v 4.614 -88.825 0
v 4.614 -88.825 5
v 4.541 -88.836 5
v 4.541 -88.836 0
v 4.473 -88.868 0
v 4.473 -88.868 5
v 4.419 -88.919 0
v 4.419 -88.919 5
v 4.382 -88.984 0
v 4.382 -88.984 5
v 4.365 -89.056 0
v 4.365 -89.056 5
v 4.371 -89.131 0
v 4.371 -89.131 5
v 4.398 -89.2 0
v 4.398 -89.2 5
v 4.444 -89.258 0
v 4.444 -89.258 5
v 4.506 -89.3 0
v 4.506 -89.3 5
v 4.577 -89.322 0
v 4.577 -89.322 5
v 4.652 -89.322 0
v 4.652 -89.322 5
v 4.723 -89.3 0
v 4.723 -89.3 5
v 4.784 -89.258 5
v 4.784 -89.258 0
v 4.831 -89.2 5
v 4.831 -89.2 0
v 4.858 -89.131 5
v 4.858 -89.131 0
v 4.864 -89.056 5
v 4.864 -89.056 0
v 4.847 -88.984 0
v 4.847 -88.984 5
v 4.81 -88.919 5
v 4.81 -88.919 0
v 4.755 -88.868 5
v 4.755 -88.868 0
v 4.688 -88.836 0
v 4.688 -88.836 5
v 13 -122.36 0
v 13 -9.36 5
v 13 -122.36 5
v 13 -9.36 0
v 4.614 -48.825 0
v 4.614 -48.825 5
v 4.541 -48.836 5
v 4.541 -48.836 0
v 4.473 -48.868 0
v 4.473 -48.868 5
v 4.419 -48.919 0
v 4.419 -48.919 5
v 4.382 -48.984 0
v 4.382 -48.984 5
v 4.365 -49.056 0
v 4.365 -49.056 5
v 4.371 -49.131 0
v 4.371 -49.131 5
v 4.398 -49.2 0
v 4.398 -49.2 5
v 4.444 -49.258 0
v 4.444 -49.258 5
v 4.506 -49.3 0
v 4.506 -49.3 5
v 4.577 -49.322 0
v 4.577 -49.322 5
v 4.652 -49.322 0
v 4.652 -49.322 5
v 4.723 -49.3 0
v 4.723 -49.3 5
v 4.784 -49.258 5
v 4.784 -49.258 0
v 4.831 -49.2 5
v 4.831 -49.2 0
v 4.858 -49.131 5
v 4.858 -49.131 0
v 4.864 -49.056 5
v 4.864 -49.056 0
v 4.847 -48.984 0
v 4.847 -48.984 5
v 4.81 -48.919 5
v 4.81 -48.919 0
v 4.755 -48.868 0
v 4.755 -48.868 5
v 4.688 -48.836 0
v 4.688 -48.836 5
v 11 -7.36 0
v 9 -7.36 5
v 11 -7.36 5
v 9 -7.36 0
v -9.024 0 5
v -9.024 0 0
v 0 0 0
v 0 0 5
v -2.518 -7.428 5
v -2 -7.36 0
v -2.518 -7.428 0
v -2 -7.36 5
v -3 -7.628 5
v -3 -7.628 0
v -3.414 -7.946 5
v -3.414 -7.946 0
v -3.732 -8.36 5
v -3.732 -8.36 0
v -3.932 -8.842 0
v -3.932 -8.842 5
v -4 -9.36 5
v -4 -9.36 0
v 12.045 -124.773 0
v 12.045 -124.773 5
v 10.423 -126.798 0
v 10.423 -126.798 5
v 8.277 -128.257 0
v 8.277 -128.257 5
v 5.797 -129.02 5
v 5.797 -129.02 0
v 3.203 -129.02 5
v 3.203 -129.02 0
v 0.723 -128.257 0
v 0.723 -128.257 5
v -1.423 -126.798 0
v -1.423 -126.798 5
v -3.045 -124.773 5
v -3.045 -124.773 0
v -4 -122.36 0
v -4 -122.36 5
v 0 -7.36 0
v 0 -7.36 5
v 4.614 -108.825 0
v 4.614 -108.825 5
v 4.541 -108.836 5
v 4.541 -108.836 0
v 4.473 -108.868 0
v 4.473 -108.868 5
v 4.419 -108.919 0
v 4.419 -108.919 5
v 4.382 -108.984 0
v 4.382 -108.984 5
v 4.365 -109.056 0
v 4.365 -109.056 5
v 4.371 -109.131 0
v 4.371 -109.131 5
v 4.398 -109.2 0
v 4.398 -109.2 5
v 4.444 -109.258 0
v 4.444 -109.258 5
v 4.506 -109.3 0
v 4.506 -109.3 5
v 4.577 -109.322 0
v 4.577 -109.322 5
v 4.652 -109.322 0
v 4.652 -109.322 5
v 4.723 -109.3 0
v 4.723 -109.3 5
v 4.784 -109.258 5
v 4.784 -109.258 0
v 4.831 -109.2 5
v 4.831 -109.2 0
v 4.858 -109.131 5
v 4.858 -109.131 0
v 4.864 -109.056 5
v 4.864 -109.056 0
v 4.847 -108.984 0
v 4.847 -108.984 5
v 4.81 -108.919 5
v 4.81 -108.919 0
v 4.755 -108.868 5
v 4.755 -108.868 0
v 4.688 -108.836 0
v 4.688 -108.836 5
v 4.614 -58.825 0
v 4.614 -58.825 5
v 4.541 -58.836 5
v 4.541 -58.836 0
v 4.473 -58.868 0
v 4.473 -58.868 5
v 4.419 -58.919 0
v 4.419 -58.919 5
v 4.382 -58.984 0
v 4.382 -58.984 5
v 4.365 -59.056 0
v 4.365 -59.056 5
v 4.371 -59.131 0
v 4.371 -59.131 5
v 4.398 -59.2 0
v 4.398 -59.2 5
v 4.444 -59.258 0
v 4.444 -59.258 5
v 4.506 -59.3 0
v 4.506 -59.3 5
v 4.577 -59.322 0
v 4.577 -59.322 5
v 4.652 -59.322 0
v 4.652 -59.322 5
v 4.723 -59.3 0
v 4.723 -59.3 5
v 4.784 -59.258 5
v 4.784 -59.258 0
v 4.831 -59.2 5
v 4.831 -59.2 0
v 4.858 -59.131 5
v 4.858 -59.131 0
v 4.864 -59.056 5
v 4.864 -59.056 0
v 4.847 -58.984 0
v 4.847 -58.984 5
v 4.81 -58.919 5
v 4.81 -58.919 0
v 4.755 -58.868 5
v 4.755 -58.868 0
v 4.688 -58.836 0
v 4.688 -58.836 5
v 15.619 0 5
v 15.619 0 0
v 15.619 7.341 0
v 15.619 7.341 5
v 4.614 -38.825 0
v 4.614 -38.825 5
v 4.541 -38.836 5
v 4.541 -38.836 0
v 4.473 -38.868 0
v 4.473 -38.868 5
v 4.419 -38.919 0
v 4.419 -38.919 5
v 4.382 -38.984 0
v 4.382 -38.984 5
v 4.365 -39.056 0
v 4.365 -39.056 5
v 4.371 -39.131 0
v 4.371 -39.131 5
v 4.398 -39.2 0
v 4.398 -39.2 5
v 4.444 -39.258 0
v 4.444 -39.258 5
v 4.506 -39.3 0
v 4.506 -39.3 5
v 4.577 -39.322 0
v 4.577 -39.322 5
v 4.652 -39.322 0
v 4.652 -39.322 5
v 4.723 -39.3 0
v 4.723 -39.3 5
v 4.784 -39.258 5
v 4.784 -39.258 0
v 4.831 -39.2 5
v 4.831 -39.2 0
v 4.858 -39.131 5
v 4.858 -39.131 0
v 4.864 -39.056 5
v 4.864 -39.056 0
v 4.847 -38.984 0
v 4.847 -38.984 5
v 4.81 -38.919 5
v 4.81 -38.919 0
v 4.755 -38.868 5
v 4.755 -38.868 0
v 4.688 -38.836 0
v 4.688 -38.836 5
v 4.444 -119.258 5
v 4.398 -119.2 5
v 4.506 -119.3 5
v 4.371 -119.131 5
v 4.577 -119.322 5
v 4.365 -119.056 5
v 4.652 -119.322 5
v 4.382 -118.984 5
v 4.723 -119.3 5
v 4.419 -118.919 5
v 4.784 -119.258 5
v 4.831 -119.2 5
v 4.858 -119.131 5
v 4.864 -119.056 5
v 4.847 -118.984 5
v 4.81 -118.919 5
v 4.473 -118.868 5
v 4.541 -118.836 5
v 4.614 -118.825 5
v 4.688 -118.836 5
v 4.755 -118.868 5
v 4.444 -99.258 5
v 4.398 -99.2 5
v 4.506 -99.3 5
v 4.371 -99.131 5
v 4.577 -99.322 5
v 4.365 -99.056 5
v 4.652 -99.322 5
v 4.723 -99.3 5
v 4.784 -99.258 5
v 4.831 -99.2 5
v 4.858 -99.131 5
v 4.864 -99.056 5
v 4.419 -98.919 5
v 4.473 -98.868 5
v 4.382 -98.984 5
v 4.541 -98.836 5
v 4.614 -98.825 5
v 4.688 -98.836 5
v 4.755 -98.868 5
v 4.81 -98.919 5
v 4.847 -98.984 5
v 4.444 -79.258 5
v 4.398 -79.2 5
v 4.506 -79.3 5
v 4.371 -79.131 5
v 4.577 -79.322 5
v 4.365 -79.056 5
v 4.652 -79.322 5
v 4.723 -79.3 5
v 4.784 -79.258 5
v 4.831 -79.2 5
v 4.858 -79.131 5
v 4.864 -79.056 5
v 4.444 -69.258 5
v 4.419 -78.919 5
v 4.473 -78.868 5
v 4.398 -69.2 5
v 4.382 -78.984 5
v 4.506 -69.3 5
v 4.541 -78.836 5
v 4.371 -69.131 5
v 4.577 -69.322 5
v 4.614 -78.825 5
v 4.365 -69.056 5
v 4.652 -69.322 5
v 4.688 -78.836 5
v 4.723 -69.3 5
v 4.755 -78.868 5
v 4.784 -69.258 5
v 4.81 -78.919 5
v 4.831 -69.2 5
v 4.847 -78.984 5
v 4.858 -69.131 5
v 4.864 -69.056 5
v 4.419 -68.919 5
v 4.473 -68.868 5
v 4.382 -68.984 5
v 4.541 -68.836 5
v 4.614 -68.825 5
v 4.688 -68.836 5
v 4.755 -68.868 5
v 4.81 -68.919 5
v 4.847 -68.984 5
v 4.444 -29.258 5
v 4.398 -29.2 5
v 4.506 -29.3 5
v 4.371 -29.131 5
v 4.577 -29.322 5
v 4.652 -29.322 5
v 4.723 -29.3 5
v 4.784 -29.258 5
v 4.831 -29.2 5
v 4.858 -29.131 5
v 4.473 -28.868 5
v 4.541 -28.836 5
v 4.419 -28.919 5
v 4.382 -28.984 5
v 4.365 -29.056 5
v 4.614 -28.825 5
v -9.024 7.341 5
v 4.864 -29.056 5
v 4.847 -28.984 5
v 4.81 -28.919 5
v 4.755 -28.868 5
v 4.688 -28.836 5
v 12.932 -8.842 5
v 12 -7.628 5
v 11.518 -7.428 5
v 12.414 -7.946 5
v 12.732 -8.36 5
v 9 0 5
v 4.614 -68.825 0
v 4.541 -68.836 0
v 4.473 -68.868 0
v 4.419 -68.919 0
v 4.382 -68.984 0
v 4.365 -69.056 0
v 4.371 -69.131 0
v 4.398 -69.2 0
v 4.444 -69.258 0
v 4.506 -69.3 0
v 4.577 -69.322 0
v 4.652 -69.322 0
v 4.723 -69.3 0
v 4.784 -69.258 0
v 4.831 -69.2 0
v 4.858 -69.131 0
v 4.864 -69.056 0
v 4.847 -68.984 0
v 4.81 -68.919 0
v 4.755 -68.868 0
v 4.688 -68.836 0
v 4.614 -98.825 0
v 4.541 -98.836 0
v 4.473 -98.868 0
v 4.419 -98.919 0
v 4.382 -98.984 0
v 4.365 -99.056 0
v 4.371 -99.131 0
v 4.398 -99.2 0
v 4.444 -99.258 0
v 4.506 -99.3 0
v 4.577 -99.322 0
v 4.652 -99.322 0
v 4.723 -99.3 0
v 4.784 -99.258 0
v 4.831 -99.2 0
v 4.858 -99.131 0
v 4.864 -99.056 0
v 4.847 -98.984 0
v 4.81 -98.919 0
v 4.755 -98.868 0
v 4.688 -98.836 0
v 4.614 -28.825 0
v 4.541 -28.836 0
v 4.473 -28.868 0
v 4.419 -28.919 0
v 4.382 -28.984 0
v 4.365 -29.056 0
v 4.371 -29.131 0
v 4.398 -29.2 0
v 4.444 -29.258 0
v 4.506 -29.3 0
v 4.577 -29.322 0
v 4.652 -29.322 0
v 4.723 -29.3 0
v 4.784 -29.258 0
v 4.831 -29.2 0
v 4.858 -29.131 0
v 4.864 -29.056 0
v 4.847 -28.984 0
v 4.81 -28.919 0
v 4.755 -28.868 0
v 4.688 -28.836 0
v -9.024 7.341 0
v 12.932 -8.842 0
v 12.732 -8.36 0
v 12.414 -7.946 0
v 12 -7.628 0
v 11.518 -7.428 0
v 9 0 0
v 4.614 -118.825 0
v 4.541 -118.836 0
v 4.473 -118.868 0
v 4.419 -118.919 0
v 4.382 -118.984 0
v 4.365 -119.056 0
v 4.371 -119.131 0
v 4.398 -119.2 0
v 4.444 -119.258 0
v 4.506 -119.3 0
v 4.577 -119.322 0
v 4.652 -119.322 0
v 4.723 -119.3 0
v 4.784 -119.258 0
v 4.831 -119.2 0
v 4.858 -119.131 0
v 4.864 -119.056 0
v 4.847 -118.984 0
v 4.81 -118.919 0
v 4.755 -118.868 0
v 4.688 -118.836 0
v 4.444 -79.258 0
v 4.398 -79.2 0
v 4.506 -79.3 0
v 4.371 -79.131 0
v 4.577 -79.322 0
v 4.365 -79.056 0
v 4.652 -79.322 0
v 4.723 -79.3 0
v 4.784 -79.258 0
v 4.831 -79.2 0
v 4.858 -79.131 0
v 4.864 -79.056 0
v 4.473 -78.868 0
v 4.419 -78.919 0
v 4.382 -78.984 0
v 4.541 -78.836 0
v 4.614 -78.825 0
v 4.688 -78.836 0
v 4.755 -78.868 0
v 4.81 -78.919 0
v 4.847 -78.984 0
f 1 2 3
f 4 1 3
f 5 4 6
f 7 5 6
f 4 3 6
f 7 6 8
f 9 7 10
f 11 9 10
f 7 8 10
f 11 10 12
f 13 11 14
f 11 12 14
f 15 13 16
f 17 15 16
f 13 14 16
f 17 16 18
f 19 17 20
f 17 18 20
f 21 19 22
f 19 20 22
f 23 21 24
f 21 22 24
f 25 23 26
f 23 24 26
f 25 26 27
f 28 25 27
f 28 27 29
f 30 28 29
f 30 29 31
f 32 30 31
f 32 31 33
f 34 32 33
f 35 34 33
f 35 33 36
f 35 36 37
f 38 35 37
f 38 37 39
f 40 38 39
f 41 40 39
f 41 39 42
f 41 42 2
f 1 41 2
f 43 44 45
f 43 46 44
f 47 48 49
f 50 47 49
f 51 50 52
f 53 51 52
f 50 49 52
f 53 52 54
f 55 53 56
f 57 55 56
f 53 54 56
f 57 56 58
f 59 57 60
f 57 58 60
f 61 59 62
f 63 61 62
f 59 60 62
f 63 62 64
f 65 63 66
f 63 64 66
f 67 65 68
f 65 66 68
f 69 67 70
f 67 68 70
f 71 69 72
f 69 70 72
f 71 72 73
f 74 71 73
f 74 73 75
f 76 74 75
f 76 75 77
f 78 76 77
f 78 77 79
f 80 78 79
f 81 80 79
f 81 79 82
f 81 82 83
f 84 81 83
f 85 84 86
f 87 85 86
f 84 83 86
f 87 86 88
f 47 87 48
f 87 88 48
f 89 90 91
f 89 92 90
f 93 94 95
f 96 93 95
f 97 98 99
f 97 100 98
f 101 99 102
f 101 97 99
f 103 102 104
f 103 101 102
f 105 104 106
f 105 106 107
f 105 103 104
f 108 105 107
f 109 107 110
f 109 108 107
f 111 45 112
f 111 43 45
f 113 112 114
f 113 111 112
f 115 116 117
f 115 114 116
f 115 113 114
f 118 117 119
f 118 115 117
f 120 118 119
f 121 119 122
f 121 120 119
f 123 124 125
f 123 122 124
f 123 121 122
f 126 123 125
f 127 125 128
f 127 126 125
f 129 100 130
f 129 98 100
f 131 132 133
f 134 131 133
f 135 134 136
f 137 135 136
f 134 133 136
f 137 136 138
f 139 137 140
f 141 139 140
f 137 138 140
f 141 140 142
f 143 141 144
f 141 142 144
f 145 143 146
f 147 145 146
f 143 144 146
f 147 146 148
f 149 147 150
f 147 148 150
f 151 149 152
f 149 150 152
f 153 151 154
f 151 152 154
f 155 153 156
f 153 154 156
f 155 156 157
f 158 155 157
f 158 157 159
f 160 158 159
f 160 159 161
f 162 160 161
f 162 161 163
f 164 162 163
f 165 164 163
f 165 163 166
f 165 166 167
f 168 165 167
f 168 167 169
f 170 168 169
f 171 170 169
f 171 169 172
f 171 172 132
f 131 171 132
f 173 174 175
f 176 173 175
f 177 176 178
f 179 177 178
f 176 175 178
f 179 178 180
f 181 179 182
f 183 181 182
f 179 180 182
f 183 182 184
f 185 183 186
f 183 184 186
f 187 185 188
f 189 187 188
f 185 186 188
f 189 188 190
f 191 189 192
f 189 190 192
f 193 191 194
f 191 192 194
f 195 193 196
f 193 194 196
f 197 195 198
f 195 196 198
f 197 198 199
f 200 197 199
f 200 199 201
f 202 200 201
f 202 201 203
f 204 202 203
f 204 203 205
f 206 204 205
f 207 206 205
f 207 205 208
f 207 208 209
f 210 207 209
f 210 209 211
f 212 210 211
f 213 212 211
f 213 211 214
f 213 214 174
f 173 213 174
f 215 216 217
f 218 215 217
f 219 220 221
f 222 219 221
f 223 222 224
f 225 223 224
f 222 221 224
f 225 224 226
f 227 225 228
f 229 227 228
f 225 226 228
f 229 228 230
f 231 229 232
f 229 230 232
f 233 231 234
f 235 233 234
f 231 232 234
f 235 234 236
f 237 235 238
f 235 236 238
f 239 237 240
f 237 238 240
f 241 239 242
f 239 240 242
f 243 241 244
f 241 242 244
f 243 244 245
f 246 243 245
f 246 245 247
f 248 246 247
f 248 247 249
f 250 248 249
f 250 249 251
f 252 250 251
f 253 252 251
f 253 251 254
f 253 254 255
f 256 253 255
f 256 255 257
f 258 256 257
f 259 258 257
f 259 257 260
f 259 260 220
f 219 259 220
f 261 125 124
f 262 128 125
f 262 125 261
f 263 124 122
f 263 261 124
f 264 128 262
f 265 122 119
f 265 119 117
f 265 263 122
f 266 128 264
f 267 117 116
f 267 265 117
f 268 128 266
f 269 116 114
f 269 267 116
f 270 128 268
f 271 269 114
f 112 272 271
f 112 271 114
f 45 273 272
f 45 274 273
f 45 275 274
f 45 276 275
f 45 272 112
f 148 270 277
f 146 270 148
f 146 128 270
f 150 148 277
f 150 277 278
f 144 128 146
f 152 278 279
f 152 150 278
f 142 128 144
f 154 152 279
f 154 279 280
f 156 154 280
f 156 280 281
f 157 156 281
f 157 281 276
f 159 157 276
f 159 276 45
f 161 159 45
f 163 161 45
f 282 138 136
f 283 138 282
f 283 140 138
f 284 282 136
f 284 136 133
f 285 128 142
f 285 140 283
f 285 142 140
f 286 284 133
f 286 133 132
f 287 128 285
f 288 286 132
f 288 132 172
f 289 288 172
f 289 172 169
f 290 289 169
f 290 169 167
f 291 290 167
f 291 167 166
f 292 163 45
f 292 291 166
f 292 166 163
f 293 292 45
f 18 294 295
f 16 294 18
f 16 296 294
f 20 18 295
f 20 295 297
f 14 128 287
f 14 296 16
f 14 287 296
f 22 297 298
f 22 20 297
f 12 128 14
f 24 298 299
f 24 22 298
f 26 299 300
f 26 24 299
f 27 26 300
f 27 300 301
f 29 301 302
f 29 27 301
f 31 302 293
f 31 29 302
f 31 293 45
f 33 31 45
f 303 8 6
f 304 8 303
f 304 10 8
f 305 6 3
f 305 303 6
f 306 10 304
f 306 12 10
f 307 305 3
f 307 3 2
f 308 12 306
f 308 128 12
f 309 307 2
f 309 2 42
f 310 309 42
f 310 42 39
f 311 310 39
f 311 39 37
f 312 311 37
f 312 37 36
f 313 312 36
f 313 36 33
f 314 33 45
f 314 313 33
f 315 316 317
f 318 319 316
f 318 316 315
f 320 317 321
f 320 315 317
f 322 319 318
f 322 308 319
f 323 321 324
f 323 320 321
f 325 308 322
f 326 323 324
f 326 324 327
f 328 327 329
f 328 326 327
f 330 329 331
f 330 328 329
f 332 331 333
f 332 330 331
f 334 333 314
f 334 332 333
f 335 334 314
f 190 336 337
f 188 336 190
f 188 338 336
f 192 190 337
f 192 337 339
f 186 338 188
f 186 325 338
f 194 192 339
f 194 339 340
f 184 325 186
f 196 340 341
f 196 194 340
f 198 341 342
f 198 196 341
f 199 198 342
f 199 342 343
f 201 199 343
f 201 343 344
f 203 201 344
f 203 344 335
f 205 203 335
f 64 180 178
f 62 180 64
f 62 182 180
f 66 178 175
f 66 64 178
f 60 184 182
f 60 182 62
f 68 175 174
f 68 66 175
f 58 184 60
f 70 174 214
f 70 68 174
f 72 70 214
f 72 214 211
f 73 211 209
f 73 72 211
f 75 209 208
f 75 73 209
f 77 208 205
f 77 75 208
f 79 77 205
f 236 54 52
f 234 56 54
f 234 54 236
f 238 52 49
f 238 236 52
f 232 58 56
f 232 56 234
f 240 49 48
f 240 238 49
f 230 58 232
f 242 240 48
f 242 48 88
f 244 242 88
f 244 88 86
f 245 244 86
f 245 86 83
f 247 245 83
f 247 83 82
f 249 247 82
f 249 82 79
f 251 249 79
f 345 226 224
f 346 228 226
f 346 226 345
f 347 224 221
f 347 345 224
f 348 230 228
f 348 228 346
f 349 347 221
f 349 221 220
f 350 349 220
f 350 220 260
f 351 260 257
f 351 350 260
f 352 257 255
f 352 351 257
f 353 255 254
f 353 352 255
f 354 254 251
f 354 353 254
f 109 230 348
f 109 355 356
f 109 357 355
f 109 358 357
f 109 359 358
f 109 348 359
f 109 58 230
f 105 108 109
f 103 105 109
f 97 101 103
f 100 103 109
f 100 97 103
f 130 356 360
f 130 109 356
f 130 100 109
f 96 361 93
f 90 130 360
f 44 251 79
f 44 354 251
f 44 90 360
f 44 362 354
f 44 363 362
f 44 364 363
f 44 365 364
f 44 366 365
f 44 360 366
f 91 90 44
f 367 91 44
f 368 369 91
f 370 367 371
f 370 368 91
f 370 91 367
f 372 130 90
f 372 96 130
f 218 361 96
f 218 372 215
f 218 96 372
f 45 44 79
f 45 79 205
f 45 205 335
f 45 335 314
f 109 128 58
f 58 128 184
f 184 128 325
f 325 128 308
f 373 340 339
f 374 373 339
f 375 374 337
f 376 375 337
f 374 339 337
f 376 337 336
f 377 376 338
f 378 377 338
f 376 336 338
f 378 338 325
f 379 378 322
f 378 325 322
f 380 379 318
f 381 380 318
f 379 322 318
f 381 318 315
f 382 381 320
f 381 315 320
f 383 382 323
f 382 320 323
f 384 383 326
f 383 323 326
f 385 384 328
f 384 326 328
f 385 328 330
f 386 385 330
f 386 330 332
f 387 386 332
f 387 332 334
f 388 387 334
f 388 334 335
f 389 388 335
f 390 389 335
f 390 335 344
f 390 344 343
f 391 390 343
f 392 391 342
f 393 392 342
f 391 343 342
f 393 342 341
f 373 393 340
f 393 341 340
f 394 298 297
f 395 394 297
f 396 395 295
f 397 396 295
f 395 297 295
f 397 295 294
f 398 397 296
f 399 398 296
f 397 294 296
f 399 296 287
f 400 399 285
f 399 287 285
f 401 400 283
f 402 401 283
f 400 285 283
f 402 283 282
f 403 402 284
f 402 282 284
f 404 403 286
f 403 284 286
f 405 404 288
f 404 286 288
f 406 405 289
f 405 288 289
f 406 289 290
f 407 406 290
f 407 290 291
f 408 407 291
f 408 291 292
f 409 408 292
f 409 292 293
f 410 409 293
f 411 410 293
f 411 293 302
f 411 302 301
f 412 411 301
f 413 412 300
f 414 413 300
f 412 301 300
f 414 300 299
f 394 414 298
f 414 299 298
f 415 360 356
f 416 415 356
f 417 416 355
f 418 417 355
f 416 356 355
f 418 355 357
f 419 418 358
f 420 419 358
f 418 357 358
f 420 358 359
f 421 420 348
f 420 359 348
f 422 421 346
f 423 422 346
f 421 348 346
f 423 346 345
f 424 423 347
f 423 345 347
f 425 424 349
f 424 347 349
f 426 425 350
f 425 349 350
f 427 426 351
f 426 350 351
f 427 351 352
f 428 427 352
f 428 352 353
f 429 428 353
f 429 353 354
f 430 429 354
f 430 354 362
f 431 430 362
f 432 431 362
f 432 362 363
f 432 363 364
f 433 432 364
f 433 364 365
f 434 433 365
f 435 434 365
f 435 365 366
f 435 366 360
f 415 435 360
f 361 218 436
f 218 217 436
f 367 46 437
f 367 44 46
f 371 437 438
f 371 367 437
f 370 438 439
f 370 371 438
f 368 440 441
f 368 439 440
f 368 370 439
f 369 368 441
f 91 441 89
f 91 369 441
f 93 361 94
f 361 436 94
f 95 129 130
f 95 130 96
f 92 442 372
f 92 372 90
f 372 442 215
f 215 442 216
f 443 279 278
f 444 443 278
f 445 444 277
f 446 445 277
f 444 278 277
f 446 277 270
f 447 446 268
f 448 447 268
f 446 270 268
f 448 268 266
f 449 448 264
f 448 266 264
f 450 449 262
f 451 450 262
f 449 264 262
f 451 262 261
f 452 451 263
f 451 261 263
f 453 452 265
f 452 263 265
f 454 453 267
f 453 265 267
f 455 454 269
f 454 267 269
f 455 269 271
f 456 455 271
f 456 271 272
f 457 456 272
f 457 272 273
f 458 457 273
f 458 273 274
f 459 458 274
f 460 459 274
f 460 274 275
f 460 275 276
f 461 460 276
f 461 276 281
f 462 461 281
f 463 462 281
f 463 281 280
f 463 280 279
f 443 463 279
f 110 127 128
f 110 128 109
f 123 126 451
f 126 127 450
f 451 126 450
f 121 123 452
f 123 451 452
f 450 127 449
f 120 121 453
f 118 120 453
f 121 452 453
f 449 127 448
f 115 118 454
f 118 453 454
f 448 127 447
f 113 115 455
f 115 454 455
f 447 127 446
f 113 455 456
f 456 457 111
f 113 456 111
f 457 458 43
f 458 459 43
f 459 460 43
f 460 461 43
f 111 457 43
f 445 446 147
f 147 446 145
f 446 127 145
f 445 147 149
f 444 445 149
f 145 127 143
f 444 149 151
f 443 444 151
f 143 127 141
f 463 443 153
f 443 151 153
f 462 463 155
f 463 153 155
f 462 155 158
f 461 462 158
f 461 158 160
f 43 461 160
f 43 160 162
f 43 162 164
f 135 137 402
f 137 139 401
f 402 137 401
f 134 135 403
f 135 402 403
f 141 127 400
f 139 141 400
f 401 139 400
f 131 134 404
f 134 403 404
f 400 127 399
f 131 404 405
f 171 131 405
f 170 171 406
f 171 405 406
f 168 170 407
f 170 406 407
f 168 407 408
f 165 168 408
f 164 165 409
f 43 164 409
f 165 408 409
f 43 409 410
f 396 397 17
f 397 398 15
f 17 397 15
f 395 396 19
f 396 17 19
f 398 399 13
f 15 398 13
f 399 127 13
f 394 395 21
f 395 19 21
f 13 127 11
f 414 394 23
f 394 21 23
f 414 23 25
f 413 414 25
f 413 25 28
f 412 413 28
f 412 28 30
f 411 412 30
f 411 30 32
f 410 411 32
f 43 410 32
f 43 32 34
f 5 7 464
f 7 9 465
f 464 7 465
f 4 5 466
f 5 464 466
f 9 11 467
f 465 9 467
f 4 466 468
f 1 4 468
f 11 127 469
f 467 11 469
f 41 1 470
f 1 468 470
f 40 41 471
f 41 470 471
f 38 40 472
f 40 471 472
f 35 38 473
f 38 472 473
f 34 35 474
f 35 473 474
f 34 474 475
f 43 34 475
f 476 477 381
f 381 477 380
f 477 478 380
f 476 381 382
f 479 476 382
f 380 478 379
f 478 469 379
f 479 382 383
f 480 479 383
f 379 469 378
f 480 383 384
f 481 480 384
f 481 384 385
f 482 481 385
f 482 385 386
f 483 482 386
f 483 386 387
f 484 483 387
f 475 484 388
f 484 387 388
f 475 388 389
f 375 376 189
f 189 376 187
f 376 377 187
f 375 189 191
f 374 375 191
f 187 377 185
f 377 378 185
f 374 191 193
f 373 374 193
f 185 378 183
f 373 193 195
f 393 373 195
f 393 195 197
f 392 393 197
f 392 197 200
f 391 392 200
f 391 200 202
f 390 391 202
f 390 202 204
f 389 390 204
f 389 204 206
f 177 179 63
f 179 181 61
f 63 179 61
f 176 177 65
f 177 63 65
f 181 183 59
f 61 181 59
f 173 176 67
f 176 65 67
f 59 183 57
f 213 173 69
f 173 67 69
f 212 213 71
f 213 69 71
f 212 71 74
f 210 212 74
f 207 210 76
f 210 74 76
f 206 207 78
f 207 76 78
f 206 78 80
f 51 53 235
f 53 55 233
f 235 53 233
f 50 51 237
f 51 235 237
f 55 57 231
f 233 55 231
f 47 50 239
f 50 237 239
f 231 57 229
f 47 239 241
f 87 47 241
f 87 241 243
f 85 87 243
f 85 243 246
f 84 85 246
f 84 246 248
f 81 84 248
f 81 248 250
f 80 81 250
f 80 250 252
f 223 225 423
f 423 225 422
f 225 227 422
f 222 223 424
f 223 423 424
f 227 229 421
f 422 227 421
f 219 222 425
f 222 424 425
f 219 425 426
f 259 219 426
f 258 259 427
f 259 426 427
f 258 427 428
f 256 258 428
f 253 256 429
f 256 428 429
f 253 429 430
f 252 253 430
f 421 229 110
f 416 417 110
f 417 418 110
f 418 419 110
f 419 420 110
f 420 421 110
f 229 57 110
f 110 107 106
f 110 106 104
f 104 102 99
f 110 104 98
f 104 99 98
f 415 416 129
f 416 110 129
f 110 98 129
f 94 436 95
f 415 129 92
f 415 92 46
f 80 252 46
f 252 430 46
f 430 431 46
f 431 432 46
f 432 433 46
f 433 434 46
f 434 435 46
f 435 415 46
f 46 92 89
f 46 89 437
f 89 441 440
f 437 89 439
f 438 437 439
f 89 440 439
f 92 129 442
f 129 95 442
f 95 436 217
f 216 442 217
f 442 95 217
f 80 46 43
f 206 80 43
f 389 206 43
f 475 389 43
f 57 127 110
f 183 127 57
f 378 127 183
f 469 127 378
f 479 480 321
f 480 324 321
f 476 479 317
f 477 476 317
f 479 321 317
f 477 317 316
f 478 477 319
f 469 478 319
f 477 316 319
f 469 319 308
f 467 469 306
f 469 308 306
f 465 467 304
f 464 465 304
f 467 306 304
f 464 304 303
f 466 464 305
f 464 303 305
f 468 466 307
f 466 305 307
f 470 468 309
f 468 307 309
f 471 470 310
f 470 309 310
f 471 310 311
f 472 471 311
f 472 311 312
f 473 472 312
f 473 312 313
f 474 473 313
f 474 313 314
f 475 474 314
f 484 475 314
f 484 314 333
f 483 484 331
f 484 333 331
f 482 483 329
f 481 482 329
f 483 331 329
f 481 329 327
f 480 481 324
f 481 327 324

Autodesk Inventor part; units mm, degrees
ref_plane "YZ Plane" through (0, 0, 0) normal (1, 0, 0) x (0, 1, 0)
ref_plane "XZ Plane" through (0, 0, 0) normal (0, 1, 0) x (-1, 0, 0)
ref_plane "XY Plane" through (0, 0, 0) normal (0, 0, 1) x (1, 0, 0)
sketch "Esquisse4" plane through (0, 0, 0) normal (0, 0, 1) x (1, 0, 0)
  line L0 (0, 0) -> (9, 0)
  line L1 (9, 0) -> (9, -7.36)
  line L2 (9, -7.36) -> (13, -7.36)
  line L3 (13, -7.36) -> (13, -122.36)
  line L4 (13, -122.36) -> (-4, -122.36)
  line L5 (-4, -122.36) -> (-4, -7.36)
  line L6 (-4, -7.36) -> (0, -7.36)
  line L7 (0, -7.36) -> (0, 0)
  arc A0 (-4, -122.36) -> (13, -122.36) centre (4.5, -120.3919) ccw
  line L8 (-9.0237, 0) -> (15.6194, 0)
  line L9 (15.6194, 0) -> (15.6194, 7.3414)
  line L10 (15.6194, 7.3414) -> (-9.0237, 7.3414)
  line L11 (-9.0237, 7.3414) -> (-9.0237, 0)
  dimension "d8" = 4
  dimension "d9" = 4
  dimension "d10" = 9
  dimension "d11" = 115
  dimension "d12" = 24.6431
extrude "Extrusion1" add sketch "Esquisse4" along normal blind 5
fillet "Congé1" radius 2 2 edges at (13, -7.36, 2.5) (-4, -7.36, 2.5)
hole "Perçage1" at (4.6143, -119.075, 0) direction (0, 0, 1) diameter 0.5 end through all
pattern_linear "Réseau rectangulaire1" count 10 spacing 10 along (0, 1, 0) of "Perçage1"
sketch "Esquisse5" plane through (0, 0, 0) normal (0, 0, -1) x (-1, 0, 0)
  point P0 (0, 0)
properties part number "bracelet" material "Caoutchouc"
